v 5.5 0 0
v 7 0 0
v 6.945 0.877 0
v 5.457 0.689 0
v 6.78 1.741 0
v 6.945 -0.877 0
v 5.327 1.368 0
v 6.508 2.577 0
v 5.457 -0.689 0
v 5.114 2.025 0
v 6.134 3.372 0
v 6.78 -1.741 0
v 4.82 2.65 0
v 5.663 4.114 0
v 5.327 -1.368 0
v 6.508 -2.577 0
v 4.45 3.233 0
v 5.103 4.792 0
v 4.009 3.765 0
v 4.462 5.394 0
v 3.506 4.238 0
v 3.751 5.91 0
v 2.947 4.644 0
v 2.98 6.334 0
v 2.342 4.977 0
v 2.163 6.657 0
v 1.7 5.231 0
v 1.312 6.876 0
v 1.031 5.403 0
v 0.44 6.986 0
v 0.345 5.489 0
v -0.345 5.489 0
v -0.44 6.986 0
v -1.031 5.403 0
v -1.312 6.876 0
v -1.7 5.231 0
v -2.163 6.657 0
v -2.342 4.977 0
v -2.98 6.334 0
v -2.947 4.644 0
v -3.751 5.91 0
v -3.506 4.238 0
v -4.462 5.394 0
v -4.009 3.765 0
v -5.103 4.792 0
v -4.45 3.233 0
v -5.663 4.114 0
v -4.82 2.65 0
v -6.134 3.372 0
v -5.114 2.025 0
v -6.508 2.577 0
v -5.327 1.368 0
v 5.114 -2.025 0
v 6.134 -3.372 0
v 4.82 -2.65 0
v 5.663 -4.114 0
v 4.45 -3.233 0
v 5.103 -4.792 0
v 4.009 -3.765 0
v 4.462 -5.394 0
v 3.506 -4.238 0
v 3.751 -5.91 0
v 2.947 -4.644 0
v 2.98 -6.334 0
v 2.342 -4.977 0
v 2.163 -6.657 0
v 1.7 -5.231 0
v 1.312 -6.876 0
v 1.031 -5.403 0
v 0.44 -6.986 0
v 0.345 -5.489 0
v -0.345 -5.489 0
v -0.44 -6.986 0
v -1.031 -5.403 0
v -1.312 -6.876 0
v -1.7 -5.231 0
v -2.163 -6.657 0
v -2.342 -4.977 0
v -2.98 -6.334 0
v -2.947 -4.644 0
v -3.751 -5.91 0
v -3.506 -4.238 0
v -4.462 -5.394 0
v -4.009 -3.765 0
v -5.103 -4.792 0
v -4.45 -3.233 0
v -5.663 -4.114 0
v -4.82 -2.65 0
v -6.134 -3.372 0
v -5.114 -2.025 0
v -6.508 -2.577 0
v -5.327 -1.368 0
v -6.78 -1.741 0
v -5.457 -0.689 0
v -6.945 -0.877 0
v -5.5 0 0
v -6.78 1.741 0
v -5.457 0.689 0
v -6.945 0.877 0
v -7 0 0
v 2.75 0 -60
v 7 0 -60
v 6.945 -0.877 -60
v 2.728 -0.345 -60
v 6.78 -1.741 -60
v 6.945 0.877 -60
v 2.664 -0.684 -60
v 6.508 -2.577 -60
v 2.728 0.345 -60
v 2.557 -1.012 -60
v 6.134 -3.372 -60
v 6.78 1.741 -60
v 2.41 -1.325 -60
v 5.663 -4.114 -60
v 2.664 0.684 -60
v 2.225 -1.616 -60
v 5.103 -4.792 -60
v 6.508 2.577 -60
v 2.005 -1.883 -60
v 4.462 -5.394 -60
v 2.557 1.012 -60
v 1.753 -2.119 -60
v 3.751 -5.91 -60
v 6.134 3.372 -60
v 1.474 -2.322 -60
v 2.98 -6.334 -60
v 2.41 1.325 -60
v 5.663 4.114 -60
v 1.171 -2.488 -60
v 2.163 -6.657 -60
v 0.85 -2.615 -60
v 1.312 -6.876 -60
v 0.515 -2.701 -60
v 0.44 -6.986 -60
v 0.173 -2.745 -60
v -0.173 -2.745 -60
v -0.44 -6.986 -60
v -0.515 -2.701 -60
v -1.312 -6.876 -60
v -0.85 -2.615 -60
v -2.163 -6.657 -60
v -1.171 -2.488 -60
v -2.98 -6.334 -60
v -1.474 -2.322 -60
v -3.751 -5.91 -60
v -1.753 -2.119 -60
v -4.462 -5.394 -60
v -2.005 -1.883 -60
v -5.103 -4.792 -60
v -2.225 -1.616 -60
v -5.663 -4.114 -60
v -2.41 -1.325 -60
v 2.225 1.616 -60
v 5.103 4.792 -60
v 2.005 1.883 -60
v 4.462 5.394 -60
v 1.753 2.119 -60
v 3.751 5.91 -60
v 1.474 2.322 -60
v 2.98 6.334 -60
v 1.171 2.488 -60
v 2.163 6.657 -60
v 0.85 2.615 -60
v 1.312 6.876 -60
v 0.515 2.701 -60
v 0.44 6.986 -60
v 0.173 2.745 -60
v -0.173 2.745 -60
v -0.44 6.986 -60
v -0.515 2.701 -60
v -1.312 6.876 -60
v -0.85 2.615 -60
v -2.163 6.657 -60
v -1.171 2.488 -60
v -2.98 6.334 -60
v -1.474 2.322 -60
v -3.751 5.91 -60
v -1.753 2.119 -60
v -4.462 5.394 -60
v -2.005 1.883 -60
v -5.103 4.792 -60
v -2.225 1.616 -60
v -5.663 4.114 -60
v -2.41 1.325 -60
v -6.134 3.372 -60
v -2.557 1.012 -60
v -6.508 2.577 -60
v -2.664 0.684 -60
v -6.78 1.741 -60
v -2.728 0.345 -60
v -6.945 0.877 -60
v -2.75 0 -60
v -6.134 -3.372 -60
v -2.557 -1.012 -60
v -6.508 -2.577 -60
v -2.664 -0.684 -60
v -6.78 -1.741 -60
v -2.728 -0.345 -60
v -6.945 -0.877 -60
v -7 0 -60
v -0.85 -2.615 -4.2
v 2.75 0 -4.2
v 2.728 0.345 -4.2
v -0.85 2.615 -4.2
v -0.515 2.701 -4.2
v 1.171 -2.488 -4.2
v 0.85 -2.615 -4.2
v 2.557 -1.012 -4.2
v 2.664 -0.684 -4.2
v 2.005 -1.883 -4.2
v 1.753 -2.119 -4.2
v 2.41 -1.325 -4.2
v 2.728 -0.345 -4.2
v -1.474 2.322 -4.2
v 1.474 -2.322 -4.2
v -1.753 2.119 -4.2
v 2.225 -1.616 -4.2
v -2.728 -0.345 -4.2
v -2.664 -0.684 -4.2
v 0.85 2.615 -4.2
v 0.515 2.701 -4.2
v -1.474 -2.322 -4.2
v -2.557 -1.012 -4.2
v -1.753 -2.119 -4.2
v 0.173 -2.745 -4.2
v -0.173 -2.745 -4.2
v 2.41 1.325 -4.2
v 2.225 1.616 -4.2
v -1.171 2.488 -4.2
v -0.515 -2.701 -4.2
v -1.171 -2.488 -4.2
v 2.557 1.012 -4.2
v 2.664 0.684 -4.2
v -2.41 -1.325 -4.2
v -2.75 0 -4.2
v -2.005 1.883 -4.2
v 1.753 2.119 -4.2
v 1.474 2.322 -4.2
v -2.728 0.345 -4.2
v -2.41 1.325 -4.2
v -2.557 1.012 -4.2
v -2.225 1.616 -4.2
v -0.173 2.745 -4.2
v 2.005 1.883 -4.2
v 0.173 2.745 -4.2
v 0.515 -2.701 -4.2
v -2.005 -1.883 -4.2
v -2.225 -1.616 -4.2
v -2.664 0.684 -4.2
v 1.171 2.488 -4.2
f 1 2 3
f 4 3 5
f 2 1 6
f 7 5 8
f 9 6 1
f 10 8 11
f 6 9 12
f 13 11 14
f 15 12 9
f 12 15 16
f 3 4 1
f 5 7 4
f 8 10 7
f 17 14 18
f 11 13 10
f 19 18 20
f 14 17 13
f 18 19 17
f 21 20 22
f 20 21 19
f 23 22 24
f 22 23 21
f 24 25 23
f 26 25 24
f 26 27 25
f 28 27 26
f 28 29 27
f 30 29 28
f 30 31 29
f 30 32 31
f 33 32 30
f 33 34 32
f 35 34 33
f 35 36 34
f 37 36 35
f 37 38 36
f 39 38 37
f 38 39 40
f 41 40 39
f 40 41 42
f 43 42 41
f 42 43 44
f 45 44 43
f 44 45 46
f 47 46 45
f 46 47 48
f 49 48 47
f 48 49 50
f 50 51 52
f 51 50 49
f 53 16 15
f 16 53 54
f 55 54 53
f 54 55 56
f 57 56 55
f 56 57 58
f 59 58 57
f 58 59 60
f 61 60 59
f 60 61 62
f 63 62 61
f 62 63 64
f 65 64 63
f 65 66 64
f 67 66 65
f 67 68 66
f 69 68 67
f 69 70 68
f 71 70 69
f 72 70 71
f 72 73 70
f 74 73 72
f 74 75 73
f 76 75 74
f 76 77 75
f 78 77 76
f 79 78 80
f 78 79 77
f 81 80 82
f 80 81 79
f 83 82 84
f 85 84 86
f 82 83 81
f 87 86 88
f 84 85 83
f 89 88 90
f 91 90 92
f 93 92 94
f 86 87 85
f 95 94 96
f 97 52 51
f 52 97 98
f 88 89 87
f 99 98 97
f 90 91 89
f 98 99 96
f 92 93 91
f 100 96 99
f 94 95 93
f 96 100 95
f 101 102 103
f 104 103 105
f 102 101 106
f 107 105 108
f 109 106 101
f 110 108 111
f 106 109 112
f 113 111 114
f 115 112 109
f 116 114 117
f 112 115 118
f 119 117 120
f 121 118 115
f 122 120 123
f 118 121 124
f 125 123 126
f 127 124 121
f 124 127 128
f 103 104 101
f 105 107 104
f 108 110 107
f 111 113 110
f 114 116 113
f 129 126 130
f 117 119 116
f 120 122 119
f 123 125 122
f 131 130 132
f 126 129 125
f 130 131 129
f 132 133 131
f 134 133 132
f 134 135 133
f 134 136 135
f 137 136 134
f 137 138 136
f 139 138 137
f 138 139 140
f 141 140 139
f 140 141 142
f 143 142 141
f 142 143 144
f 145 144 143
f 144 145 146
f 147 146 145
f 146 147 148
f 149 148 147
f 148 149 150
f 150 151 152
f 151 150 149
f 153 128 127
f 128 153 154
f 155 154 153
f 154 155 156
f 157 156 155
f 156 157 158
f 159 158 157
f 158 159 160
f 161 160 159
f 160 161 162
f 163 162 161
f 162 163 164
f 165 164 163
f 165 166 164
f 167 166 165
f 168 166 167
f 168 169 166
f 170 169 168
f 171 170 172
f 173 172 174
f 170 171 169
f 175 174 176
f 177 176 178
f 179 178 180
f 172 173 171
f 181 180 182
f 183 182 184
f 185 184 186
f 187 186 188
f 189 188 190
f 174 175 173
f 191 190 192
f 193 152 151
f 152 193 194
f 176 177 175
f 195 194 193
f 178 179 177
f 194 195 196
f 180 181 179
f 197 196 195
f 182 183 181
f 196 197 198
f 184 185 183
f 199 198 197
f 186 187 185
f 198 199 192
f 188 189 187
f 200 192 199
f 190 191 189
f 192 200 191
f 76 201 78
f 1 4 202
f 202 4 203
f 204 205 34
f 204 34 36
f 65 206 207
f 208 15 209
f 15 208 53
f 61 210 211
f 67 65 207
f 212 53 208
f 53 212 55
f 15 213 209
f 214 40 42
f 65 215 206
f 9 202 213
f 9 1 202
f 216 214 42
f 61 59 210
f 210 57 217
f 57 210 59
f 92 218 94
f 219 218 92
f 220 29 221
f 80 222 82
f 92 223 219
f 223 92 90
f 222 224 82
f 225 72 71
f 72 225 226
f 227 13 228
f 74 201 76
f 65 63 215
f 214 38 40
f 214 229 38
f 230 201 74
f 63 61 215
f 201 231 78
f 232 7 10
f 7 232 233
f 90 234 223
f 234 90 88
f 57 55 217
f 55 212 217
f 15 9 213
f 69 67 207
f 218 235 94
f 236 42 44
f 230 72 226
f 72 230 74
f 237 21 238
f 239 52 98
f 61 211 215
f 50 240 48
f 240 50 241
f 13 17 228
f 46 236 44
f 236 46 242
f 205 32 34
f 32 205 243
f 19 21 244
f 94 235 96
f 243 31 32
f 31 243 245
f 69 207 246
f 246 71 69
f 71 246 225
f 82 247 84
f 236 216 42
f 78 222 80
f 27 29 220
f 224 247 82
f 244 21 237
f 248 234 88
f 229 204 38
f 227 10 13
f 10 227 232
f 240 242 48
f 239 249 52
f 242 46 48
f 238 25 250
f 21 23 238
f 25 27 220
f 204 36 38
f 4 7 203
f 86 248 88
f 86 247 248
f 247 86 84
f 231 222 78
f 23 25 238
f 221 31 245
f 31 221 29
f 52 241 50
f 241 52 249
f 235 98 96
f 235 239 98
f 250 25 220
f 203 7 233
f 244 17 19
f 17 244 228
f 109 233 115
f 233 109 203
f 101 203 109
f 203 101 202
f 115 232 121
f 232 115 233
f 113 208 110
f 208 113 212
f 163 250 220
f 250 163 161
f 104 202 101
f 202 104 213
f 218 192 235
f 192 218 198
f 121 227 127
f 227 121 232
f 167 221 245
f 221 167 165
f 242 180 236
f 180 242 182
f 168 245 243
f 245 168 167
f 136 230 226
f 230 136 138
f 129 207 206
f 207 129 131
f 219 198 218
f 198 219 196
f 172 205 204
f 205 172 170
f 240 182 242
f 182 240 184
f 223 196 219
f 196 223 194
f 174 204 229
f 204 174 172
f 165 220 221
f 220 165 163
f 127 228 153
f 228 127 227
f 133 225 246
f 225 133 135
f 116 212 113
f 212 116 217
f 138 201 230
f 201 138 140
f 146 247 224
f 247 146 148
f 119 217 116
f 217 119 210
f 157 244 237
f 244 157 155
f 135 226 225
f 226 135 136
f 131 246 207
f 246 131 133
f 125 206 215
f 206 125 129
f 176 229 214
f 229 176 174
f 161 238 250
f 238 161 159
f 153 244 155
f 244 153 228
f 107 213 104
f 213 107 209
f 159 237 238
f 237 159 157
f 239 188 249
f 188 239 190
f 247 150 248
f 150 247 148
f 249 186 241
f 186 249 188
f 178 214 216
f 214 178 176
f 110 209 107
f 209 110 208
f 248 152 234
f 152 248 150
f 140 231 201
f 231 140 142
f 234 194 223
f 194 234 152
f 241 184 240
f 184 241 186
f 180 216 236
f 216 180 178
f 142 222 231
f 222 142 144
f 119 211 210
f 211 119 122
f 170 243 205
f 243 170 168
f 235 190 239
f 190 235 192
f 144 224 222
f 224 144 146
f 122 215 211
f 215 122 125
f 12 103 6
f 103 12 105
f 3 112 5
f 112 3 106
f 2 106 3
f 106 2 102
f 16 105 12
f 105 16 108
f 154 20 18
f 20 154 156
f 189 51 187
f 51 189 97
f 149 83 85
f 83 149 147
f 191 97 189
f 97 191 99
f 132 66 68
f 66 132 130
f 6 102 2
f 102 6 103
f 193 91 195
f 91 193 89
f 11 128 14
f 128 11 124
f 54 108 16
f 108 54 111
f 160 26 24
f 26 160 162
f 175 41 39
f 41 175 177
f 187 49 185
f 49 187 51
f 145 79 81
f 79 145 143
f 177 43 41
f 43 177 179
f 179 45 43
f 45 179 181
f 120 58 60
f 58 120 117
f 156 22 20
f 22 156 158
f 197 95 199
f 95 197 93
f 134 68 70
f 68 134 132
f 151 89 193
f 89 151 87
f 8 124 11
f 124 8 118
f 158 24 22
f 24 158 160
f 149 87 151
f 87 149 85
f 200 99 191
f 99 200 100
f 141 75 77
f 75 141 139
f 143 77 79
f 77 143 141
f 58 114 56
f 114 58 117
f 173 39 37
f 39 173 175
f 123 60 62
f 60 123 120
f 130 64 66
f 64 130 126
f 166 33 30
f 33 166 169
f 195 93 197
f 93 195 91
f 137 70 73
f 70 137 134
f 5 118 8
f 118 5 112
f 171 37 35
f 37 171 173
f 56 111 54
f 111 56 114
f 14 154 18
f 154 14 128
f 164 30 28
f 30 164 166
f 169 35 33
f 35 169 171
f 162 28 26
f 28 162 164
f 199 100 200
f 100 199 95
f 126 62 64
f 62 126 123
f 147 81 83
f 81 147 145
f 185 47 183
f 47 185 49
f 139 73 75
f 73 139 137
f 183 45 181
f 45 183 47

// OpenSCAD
$fn = 50;


difference() {
	union() {
		translate(v = [0, 0, -60.0000000000]) {
			cylinder(h = 60, r = 7.0000000000);
		}
		cylinder(h = 0, r = 16.0000000000);
	}
	union() {
		translate(v = [0, 0, 0]) {
			rotate(a = [0, 0, 0]) {
				difference() {
					union() {
						#translate(v = [0, 0, -60.0000000000]) {
							cylinder(h = 60, r = 2.2500000000);
						}
						#translate(v = [0, 0, -4.2000000000]) {
							cylinder(h = 4.2000000000, r = 7.0000000000, r1 = 2.7500000000, r2 = 5.5000000000);
						}
						#translate(v = [0, 0, -60.0000000000]) {
							cylinder(h = 60, r = 2.7500000000);
						}
						#translate(v = [0, 0, -60.0000000000]) {
							cylinder(h = 60, r = 2.2500000000);
						}
					}
					union();
				}
			}
		}
	}
}
